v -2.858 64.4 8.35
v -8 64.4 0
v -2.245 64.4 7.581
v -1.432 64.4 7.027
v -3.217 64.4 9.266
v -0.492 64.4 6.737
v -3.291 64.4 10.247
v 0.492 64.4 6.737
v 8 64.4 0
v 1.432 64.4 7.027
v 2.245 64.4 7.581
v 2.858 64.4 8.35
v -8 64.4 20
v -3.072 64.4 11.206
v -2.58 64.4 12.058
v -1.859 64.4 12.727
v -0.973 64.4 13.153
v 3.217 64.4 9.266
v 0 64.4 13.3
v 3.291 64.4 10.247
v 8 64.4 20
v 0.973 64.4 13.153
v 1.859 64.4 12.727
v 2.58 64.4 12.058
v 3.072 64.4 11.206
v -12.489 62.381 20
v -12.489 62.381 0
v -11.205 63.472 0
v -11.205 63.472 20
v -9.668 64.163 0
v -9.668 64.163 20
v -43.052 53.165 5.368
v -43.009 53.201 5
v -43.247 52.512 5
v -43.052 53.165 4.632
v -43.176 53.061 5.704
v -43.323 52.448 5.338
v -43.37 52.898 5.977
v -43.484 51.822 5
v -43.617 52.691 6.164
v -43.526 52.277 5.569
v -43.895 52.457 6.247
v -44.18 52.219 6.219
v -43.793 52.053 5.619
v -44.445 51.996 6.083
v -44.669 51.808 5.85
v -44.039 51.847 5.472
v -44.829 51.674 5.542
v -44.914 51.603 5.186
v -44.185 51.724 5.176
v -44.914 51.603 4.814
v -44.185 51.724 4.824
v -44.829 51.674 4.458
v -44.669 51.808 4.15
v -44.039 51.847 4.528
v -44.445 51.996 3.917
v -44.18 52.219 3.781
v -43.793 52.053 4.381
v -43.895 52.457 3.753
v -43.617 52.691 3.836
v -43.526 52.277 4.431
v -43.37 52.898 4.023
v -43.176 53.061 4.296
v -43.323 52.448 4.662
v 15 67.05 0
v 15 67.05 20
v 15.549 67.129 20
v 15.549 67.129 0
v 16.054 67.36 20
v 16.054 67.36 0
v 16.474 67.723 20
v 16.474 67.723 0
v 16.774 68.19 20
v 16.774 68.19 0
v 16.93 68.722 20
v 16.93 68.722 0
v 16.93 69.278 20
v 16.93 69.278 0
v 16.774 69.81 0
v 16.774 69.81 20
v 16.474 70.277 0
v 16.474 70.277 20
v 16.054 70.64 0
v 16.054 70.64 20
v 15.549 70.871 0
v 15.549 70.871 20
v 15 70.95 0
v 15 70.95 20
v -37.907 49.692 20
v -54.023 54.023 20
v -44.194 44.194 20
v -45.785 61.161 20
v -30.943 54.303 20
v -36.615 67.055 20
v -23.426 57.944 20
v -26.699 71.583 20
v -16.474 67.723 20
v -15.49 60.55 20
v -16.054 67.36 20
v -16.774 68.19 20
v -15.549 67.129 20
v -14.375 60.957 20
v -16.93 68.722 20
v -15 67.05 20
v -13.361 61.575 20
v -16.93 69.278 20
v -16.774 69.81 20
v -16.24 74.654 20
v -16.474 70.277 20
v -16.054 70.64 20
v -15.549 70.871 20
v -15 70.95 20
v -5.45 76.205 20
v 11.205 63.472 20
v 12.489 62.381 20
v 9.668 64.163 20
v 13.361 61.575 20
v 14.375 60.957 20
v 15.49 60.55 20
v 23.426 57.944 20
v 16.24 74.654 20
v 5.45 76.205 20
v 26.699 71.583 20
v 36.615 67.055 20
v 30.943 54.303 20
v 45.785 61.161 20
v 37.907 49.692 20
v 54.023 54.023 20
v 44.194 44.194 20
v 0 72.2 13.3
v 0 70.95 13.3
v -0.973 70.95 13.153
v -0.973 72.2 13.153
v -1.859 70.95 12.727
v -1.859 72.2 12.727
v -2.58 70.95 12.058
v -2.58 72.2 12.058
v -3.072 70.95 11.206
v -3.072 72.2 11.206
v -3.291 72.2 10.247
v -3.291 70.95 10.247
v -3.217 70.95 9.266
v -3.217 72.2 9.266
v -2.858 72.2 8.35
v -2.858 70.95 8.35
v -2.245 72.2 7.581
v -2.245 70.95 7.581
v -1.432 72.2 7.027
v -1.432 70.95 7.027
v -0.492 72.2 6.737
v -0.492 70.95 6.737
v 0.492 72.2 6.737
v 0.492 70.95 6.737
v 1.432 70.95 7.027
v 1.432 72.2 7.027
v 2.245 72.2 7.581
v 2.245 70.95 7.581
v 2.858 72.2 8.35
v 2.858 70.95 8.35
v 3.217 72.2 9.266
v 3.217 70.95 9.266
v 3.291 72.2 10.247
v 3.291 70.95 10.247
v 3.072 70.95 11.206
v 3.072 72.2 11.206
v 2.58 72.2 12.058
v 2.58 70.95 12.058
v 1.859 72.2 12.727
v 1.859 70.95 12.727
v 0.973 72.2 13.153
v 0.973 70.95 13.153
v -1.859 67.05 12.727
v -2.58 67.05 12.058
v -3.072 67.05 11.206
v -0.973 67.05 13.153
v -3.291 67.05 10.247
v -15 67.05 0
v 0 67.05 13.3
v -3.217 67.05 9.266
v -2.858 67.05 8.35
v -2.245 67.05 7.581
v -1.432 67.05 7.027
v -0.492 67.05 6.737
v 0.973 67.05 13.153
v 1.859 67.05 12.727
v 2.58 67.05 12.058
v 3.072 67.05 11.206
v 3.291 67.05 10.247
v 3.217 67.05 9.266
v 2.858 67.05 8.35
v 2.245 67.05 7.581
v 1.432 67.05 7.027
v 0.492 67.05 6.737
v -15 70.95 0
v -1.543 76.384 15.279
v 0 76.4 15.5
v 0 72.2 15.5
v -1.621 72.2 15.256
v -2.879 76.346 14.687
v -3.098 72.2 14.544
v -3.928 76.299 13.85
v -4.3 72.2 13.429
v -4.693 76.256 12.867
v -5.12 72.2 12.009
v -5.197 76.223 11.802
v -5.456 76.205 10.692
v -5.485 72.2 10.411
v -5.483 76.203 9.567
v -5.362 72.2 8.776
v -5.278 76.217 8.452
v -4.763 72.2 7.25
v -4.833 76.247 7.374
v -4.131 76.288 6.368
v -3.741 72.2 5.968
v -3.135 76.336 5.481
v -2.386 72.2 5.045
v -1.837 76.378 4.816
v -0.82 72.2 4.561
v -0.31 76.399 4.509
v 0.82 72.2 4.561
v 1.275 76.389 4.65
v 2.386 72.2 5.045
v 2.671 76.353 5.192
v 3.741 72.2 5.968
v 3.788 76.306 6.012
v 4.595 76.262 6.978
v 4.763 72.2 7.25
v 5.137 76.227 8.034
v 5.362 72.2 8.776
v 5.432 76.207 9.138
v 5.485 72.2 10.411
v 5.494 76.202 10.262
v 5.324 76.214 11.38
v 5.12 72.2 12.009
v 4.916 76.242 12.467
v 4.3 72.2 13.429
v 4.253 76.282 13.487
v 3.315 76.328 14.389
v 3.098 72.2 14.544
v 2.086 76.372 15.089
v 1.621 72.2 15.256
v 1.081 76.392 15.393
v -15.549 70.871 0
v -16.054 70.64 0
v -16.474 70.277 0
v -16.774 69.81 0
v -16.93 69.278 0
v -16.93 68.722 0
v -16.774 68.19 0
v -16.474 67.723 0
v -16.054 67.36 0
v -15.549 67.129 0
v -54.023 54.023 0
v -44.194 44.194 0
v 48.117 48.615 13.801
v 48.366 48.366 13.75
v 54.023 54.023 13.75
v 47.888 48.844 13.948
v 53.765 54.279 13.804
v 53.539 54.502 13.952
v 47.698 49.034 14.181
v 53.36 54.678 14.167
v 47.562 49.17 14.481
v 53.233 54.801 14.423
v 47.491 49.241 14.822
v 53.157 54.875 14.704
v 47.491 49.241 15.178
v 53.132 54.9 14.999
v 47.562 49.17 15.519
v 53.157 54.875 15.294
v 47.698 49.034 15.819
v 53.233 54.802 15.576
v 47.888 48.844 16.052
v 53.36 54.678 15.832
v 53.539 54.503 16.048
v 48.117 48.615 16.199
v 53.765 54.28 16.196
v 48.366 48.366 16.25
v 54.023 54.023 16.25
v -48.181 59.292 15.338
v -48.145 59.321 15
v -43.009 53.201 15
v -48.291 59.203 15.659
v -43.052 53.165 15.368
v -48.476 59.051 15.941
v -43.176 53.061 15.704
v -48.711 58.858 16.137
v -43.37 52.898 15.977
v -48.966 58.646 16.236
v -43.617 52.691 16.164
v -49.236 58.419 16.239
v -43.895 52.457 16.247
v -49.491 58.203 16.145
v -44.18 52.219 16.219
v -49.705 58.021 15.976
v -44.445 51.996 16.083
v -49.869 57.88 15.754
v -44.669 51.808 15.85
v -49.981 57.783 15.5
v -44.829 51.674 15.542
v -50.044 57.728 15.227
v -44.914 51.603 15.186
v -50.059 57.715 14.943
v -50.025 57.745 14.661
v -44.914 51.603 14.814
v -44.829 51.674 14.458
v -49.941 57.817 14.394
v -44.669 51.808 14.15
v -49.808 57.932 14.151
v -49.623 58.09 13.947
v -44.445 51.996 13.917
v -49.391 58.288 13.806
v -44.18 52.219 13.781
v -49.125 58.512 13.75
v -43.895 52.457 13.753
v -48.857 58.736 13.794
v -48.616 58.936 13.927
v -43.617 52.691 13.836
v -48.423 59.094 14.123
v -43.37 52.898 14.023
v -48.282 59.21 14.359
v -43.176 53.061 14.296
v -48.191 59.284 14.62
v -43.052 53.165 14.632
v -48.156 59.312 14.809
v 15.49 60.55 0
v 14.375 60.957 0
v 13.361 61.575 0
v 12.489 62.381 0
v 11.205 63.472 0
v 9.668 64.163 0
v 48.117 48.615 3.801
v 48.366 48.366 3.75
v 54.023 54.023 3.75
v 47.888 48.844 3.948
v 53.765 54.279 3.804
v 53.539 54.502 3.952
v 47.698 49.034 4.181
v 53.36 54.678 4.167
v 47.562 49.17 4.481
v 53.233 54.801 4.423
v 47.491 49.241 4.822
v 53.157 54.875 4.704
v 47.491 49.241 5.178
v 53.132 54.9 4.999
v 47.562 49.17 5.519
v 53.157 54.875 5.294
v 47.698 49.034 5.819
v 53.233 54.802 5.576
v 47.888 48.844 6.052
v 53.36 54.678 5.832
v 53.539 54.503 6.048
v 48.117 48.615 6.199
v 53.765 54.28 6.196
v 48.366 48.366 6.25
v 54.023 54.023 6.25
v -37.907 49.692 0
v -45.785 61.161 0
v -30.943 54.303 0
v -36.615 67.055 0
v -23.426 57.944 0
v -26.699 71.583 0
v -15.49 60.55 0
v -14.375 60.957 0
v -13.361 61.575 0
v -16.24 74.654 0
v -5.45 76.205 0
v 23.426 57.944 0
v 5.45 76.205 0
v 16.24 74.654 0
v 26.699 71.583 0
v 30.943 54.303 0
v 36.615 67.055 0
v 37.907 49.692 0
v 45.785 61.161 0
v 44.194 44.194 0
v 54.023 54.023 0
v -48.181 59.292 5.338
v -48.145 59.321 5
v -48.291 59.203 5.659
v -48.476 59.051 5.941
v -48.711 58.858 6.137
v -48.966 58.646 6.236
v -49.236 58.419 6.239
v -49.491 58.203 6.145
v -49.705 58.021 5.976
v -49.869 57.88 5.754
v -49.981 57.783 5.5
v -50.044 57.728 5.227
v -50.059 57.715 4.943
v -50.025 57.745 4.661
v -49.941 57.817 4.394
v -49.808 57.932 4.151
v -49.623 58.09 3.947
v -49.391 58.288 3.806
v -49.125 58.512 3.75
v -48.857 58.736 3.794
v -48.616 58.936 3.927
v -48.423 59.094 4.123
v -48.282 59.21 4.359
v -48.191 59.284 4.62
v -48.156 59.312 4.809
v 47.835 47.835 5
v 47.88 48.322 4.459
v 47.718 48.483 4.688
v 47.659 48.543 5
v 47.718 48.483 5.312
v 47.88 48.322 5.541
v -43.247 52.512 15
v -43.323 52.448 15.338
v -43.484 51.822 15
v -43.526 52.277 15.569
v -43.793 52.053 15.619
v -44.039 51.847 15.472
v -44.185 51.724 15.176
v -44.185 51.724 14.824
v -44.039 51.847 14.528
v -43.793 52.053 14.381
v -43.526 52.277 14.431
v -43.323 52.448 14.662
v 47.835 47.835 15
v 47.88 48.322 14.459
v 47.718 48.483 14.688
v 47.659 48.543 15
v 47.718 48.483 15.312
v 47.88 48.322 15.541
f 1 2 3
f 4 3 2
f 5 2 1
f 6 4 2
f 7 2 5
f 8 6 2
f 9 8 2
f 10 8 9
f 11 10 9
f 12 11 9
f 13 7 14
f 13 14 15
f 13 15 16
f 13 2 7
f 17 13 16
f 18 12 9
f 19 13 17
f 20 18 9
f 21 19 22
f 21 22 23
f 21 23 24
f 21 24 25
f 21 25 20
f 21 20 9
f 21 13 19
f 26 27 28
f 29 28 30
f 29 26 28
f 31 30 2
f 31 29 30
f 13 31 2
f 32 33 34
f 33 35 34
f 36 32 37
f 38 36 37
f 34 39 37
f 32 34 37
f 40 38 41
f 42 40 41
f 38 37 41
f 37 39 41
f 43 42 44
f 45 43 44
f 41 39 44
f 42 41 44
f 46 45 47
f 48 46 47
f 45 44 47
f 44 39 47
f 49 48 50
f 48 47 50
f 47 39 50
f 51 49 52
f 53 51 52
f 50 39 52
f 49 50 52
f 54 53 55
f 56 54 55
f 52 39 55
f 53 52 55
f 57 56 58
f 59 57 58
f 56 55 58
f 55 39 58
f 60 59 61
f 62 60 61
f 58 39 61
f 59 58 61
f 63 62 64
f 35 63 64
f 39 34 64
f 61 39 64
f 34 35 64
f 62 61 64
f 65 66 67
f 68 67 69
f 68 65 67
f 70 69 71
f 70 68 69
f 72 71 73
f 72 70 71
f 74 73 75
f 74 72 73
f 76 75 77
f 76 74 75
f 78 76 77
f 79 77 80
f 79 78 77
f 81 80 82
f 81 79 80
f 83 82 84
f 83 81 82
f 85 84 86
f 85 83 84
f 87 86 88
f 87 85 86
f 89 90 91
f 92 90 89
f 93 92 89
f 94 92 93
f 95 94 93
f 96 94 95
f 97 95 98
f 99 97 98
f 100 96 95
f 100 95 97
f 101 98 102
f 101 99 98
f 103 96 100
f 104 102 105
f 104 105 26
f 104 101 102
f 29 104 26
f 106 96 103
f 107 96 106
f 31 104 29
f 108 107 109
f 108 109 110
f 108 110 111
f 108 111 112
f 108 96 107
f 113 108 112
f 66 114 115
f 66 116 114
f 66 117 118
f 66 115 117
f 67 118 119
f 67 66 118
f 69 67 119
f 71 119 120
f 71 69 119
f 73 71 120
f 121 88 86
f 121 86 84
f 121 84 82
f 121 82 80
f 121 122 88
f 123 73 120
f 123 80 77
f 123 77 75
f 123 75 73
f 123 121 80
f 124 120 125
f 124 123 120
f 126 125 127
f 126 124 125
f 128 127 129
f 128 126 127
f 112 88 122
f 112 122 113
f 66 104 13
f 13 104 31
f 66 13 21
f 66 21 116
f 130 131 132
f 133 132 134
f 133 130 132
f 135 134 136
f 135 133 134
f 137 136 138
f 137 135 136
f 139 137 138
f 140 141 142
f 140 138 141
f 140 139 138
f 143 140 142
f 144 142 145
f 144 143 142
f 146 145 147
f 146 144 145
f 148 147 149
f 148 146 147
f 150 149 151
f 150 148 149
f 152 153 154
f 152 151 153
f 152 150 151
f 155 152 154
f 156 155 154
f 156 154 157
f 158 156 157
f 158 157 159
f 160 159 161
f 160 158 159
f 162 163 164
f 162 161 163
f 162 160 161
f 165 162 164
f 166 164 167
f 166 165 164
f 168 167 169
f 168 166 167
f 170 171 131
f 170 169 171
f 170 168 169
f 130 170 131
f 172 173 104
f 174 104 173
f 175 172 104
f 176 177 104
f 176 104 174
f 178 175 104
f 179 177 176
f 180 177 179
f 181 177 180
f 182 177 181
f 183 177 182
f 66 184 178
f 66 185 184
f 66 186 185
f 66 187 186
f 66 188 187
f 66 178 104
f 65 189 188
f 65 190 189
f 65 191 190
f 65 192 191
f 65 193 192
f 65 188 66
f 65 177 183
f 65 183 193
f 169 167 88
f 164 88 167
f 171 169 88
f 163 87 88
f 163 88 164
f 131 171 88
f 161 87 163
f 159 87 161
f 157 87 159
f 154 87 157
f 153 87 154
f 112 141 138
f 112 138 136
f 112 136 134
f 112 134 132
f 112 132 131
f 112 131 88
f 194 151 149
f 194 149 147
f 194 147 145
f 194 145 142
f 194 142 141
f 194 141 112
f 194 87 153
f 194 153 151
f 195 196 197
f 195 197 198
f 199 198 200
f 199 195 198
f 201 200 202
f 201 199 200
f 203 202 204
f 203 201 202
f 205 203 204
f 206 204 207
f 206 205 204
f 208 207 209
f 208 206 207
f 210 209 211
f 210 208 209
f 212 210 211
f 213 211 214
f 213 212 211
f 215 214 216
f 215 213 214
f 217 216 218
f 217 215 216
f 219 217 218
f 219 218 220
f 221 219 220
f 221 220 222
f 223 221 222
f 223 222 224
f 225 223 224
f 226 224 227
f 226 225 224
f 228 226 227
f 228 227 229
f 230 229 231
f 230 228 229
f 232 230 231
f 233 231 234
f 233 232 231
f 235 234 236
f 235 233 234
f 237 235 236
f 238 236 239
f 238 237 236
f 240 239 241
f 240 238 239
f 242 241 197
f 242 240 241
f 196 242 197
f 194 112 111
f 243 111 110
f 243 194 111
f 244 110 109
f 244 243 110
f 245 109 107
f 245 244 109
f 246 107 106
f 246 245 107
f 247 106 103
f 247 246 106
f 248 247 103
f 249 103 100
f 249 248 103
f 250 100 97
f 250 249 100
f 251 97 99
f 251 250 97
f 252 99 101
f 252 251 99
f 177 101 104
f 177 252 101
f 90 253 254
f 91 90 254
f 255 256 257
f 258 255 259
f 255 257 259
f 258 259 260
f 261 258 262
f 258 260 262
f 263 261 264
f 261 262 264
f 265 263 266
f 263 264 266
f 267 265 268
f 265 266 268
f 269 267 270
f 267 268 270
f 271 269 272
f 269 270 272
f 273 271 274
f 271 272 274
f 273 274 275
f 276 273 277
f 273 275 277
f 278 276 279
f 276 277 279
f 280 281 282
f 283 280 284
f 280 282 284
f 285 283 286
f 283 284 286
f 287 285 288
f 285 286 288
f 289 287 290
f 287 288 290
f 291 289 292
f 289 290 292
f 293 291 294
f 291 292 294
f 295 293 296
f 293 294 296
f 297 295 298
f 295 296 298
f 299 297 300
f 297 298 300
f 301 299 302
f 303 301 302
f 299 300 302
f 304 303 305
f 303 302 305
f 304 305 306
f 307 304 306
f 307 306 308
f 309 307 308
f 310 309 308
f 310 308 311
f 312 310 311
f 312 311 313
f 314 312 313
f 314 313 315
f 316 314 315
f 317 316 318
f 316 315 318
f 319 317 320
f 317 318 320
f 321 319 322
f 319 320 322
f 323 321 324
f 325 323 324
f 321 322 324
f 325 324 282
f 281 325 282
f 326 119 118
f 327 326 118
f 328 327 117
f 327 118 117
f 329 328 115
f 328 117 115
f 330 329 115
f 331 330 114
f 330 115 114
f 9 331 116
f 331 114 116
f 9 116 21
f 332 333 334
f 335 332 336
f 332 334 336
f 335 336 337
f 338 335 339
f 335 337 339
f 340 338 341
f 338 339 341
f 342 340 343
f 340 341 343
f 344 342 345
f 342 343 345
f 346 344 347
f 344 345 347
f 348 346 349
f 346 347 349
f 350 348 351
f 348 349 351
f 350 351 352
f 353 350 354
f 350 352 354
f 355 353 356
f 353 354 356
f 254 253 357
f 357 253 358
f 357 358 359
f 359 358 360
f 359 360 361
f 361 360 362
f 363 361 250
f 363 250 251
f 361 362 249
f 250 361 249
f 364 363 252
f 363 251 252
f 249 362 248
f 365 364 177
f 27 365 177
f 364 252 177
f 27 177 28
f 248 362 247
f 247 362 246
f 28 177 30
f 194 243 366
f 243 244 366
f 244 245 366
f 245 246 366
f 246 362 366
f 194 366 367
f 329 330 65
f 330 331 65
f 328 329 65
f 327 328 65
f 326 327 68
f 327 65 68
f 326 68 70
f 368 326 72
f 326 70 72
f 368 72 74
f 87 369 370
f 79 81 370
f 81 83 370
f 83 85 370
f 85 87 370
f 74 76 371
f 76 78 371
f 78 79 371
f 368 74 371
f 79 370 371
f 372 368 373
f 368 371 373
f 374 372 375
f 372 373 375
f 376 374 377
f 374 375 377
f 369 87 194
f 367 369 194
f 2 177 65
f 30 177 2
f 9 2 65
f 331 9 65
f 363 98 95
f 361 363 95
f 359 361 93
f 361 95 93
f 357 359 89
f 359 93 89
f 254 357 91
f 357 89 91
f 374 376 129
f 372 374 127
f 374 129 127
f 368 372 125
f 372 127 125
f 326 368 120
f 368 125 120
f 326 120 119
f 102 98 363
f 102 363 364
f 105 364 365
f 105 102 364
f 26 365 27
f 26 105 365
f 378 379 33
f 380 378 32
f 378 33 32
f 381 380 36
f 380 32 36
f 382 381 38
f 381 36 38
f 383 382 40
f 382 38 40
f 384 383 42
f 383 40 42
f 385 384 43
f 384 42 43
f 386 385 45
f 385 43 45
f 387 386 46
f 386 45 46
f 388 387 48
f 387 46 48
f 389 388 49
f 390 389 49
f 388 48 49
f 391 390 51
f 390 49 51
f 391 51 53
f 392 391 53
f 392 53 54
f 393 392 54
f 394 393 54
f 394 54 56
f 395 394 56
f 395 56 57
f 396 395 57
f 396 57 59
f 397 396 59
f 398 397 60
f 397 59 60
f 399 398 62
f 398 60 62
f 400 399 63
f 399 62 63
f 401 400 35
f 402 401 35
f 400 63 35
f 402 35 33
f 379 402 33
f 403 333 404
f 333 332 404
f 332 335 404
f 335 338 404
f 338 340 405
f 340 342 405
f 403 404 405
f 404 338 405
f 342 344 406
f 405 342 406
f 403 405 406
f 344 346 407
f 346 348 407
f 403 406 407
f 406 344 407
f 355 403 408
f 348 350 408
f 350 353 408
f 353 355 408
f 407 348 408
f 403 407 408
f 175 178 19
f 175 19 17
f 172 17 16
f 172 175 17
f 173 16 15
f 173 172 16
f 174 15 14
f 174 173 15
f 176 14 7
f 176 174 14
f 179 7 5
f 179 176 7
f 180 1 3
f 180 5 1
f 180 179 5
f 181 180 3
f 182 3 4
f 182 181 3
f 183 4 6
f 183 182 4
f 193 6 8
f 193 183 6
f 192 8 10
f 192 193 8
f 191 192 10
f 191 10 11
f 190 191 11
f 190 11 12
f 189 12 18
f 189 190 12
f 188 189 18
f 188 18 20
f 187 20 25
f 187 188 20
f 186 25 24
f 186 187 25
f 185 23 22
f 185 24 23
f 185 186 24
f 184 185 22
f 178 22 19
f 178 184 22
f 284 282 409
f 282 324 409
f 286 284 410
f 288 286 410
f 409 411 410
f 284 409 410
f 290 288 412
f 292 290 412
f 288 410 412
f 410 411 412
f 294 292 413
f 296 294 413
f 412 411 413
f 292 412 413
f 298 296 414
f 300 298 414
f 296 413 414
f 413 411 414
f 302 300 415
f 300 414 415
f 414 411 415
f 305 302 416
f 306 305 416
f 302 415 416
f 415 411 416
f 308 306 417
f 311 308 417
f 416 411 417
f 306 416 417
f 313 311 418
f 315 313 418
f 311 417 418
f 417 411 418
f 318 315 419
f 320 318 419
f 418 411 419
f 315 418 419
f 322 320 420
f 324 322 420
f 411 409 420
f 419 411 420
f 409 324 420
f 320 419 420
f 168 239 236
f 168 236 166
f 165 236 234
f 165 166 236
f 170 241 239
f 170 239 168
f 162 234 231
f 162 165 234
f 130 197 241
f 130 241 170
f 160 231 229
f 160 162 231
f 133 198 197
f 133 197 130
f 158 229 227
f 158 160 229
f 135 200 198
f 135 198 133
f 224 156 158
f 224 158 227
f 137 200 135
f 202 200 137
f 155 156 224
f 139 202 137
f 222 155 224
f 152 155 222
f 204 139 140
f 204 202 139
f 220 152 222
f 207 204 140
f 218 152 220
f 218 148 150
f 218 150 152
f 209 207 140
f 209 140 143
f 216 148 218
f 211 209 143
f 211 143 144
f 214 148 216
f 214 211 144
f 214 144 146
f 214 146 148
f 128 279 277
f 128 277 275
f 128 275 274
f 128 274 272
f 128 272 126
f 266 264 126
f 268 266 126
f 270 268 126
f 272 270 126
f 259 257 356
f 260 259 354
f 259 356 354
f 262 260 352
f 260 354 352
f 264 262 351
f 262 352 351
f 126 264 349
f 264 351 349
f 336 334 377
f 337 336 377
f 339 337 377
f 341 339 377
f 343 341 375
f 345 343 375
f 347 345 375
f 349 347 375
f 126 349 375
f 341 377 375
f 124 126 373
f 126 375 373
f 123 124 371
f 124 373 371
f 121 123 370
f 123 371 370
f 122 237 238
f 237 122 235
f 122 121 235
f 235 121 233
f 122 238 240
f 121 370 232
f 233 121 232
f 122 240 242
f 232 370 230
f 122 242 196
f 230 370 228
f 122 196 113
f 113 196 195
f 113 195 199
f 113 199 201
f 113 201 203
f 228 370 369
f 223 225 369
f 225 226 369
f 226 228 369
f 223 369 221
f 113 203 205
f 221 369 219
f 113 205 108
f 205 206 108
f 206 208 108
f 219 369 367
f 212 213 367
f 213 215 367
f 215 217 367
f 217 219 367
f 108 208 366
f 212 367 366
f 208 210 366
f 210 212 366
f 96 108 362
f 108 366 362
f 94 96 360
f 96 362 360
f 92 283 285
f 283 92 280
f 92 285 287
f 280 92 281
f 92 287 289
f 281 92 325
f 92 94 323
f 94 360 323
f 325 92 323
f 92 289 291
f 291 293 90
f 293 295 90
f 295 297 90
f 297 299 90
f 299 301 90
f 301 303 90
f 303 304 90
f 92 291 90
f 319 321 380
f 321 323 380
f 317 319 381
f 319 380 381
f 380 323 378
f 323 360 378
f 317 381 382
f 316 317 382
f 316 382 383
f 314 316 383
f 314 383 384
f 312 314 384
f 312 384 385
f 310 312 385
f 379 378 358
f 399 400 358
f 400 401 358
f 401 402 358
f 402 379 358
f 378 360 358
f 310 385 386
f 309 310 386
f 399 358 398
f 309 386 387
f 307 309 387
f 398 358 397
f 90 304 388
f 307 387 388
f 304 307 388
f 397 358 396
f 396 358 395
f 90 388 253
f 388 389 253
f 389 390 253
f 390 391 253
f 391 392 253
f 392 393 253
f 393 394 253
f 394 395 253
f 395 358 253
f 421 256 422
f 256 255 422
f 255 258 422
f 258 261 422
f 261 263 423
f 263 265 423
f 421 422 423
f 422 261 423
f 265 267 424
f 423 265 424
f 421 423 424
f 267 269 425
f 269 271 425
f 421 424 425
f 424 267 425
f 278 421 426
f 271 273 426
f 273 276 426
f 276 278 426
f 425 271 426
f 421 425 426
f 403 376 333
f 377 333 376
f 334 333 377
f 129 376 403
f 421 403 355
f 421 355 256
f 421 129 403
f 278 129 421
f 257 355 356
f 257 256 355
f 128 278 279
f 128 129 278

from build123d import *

# Parameters (mm, degrees)
SKETCH1_R                    = 76.4
BOSS_EXTRUDE1_DEPTH          = 20
CUT_EXTRUDE1_REACH           = 111.881
SKETCH2_R                    = 62.5
CUT_EXTRUDE2_DEPTH           = 110.881390599
CIRPATTERN1_COUNT            = 4
R_P_TITION_CIRCULAIRE2_COUNT = 4
CUT_EXTRUDE4_START           = -20
CUT_EXTRUDE4_DEPTH           = 130.881390756
CIRPATTERN8_COUNT            = 4
CIRPATTERN8_START            = -20
CIRPATTERN8_COPY_1_DEPTH     = 130.881390756
CIRPATTERN8_COPY_2_DEPTH     = 130.881390756
CIRPATTERN8_COPY_3_DEPTH     = 130.881390756
SPLIT1_SURFACE_1_BACK        = 218.015
SPLIT1_SURFACE_1_DEPTH       = 436.03


# Read off the part's stored shape, not the designer's step: Répétition circulaire1, Répétition linéaire1
with BuildPart() as part:
    # Sketch1 → Boss-Extrude1 (new body)
    with BuildSketch(Plane.XY):
        Circle(SKETCH1_R)
    extrude(amount=BOSS_EXTRUDE1_DEPTH)

    # Sketch2 → Cut-Extrude1 (cut, up to next)
    with BuildSketch(Plane.XY.offset(20), mode=Mode.PRIVATE) as cut_extrude1_sk1:
        Circle(SKETCH2_R)
    cut_extrude1_tool1 = extrude(cut_extrude1_sk1.sketch, amount=-CUT_EXTRUDE1_REACH, mode=Mode.PRIVATE) & part.part
    add(cut_extrude1_tool1.solids().sort_by_distance((0, 0, 20))[0], mode=Mode.SUBTRACT)

    # Sketch39 → Cut-Extrude2 (cut, through all)
    with BuildSketch(Plane(origin=(0, 0, 0), x_dir=(-1, 0, 0), z_dir=(0, 0, -1))):
        with BuildLine():
            Line((-15, 70.95), (15, 70.95))
            ThreePointArc((15, 70.95), (16.95, 69), (15, 67.05))
            Line((15, 67.05), (-15, 67.05))
            ThreePointArc((-15, 67.05), (-16.95, 69), (-15, 70.95))
        make_face()
    cut_extrude2 = extrude(amount=-CUT_EXTRUDE2_DEPTH, mode=Mode.SUBTRACT)

    # CirPattern1: Cut-Extrude2 ×4 about axis
    cirpattern1_axis = Axis((0, 0, 0), (0, 0, 1))
    for i in range(1, CIRPATTERN1_COUNT):
        add(cut_extrude2.rotate(cirpattern1_axis, i * 360 / CIRPATTERN1_COUNT), mode=Mode.SUBTRACT)

    # Esquisse2 → M3 Tapped Hole1 (revolve, cut)
    with BuildSketch(Plane(origin=(49.10897338, -58.525795454, 5), x_dir=(0.766044443118979, 0.6427876096865381, 0), z_dir=(0, 0, 1))):
        Polygon((0, 0), (0, 8.751075774), (1.25, 8), (1.25, 0), align=None)
    revolve(axis=Axis((53.190674702, -63.390177668, 5), (-0.6427876096865383, 0.766044443118979, 0)), mode=Mode.SUBTRACT)

    # Esquisse2 at point 2 (carried to point 2, square into its face) → M3 Tapped Hole1 at 2 (revolve, cut)
    with BuildSketch(Plane(origin=(-54.022958083, -54.022958083, 5), x_dir=(0.707106781, -0.707106781, 0), z_dir=(0, 0, 1))):
        Polygon((0, 0), (0, 8.751075774), (1.25, 8), (1.25, 0), align=None)
    revolve(axis=Axis((-58.513086143, -58.513086143, 5), (0.707106781, 0.707106781, 0)), mode=Mode.SUBTRACT)

    # Esquisse2 at point 3 (carried to point 3, square into its face) → M3 Tapped Hole1 at 3 (revolve, cut)
    with BuildSketch(Plane(origin=(-58.525795454, 49.10897338, 5), x_dir=(-0.642788057, -0.766044068, 0), z_dir=(0, 0, 1))):
        Polygon((0, 0), (0, 8.751075774), (1.25, 8), (1.25, 0), align=None)
    revolve(axis=Axis((-63.390175285, 53.190677542, 5), (0.766044068, -0.642788057, 0)), mode=Mode.SUBTRACT)

    # Répétition circulaire1 outline → Répétition circulaire1 (revolve, cut)
    with BuildSketch(Plane(origin=(0, 0, 5), x_dir=(0.6427876096865408, 0.7660444431189769, 0), z_dir=(0, 0, -1))):
        Polygon((0, 67.648924226), (1.25, 68.4), (1.25, 76.400001412), (0, 76.400001412), align=None)
    revolve(axis=Axis((0, 0, 5), (0.7660444431189771, -0.6427876096865409, 0)), mode=Mode.SUBTRACT)

    # R_p_tition circulaire1 2 outline → R_p_tition circulaire1 2 (revolve, cut)
    with BuildSketch(Plane(origin=(0, 0, 5), x_dir=(0.707106781186546, -0.707106781186549, 0), z_dir=(0, 0, 1))):
        Polygon((0, 67.648924226), (1.25, 68.4), (1.25, 76.400001412), (0, 76.400001412), align=None)
    revolve(axis=Axis((0, 0, 5), (0.707106781186549, 0.707106781186546, 0)), mode=Mode.SUBTRACT)

    # R_p_tition circulaire1 3 outline → R_p_tition circulaire1 3 (revolve, cut)
    with BuildSketch(Plane(origin=(0, 0, 5), x_dir=(0.7660444431189789, 0.6427876096865381, 0), z_dir=(0, 0, -1))):
        Polygon((1.25, -76.400001412), (1.25, -68.4), (0, -67.648924226), (0, -76.400001412), align=None)
    revolve(axis=Axis((0, 0, 5), (0.6427876096865381, -0.7660444431189789, 0)), mode=Mode.SUBTRACT)

    # Répétition linéaire1 outline → Répétition linéaire1 (revolve, cut)
    with BuildSketch(Plane(origin=(0, 0, 15), x_dir=(0.6427876096865408, 0.7660444431189769, 0), z_dir=(0, 0, -1))):
        Polygon((1.25, -76.400001412), (1.25, -68.4), (0, -67.648924226), (0, -76.400001412), align=None)
        Polygon((0, 76.400001412), (0, 67.648924226), (1.25, 68.4), (1.25, 76.400001412), align=None)
    revolve(axis=Axis((0, 0, 15), (0.7660444431189771, -0.6427876096865409, 0)), mode=Mode.SUBTRACT)

    # R_p_tition lin_aire1 2 outline → R_p_tition lin_aire1 2 (revolve, cut)
    with BuildSketch(Plane(origin=(0, 0, 15), x_dir=(0.707106781186546, -0.707106781186549, 0), z_dir=(0, 0, 1))):
        Polygon((1.25, -76.400001412), (1.25, -68.4), (0, -67.648924226), (0, -76.400001412), align=None)
        Polygon((0, 76.400001412), (0, 67.648924226), (1.25, 68.4), (1.25, 76.400001412), align=None)
    revolve(axis=Axis((0, 0, 15), (0.707106781186549, 0.707106781186546, 0)), mode=Mode.SUBTRACT)

    # R_p_tition lin_aire1 3 outline → R_p_tition lin_aire1 3 (revolve, cut)
    with BuildSketch(Plane(origin=(0, 0, 15), x_dir=(0.7660444431189789, 0.6427876096865381, 0), z_dir=(0, 0, -1))):
        Polygon((0, 67.648924226), (1.25, 68.4), (1.25, 76.400001412), (0, 76.400001412), align=None)
        Polygon((1.25, -68.4), (0, -67.648924226), (0, -76.400001412), (1.25, -76.400001412), align=None)
    revolve(axis=Axis((0, 0, 15), (0.6427876096865381, -0.7660444431189789, 0)), mode=Mode.SUBTRACT)

    # Esquisse4 → CBORE for M6 Hex Socket Head Cap Screw1 (revolve, cut)
    with BuildSketch(Plane(origin=(0, 76.4, 10), x_dir=(0, 0, 1), z_dir=(1, 0, 0))):
        Polygon((0, 0), (0, 30.482840043), (3.3, 28.5), (3.3, 4.2), (5.5, 4.2), (5.5, 0), align=None)
    cbore_for_m6_hex_socket_head_cap_screw1 = revolve(axis=Axis((0, 82.75, 10), (0, -1, 0)), mode=Mode.SUBTRACT)

    # Répétition circulaire2: CBORE for M6 Hex Socket Head Cap Screw1 ×4 about axis
    r_p_tition_circulaire2_axis = Axis((0, 0, 0), (0, 0, 1))
    for i in range(1, R_P_TITION_CIRCULAIRE2_COUNT):
        add(cbore_for_m6_hex_socket_head_cap_screw1.rotate(r_p_tition_circulaire2_axis, i * 360 / R_P_TITION_CIRCULAIRE2_COUNT), mode=Mode.SUBTRACT)

    # Sketch47 → Cut-Extrude4 (cut)
    with BuildSketch(Plane(origin=(0, 0, 0), x_dir=(-1, 0, 0), z_dir=(0, 0, -1)).offset(CUT_EXTRUDE4_START)):
        with BuildLine():
            Line((8, 64.4), (0, 64.4))
            Line((0, 64.4), (0, 62.5))
            ThreePointArc((0, 62.5), (7.806310396, 62.010575856), (15.490361696, 60.549968576))
            ThreePointArc((15.490361696, 60.549968576), (13.852369253, 61.240856226), (12.488718209, 62.38138278))
            ThreePointArc((12.488718209, 62.38138278), (10.460864007, 63.872124664), (8, 64.4))
        make_face()
    cut_extrude4 = extrude(amount=CUT_EXTRUDE4_DEPTH, mode=Mode.SUBTRACT)

    # Mirror1: Cut-Extrude4 across plane
    add(cut_extrude4.mirror(Plane.ZY), mode=Mode.SUBTRACT)

    # CirPattern8: Cut-Extrude4 ×4 about axis
    cirpattern8_axis = Axis((0, 0, 0), (0, 0, 1))
    for i in range(1, CIRPATTERN8_COUNT):
        add(cut_extrude4.rotate(cirpattern8_axis, i * 360 / CIRPATTERN8_COUNT), mode=Mode.SUBTRACT)

    # CirPattern8 copy 1 sketch → CirPattern8 copy 1 (cut)
    with BuildSketch(Plane.YX.offset(CIRPATTERN8_START)):
        with BuildLine():
            Line((8, -64.4), (0, -64.4))
            Line((0, -64.4), (0, -62.5))
            ThreePointArc((0, -62.5), (7.806310396, -62.010575856), (15.490361696, -60.549968576))
            ThreePointArc((15.490361696, -60.549968576), (13.852369253, -61.240856226), (12.488718209, -62.38138278))
            ThreePointArc((12.488718209, -62.38138278), (10.460864007, -63.872124664), (8, -64.4))
        make_face()
    extrude(amount=CIRPATTERN8_COPY_1_DEPTH, mode=Mode.SUBTRACT)

    # CirPattern8 copy 2 sketch → CirPattern8 copy 2 (cut)
    with BuildSketch(Plane(origin=(0, 0, 0), x_dir=(-1, 0, 0), z_dir=(0, 0, -1)).offset(CIRPATTERN8_START)):
        with BuildLine():
            Line((8, -64.4), (0, -64.4))
            Line((0, -64.4), (0, -62.5))
            ThreePointArc((0, -62.5), (7.806310396, -62.010575856), (15.490361696, -60.549968576))
            ThreePointArc((15.490361696, -60.549968576), (13.852369253, -61.240856226), (12.488718209, -62.38138278))
            ThreePointArc((12.488718209, -62.38138278), (10.460864007, -63.872124664), (8, -64.4))
        make_face()
    extrude(amount=CIRPATTERN8_COPY_2_DEPTH, mode=Mode.SUBTRACT)

    # CirPattern8 copy 3 sketch → CirPattern8 copy 3 (cut)
    with BuildSketch(Plane(origin=(0, 0, 0), x_dir=(0, -1, 0), z_dir=(0, 0, -1)).offset(CIRPATTERN8_START)):
        with BuildLine():
            Line((8, -64.4), (0, -64.4))
            Line((0, -64.4), (0, -62.5))
            ThreePointArc((0, -62.5), (7.806310396, -62.010575856), (15.490361696, -60.549968576))
            ThreePointArc((15.490361696, -60.549968576), (13.852369253, -61.240856226), (12.488718209, -62.38138278))
            ThreePointArc((12.488718209, -62.38138278), (10.460864007, -63.872124664), (8, -64.4))
        make_face()
    extrude(amount=CIRPATTERN8_COPY_3_DEPTH, mode=Mode.SUBTRACT)

    # Split1: cut with a surface, the side behind it stays
    # Split1 surface: a surface, the sketch's curves swept straight by 436.03 mm
    with BuildLine(Plane(origin=(0, 0, 0), x_dir=(-1, 0, 0), z_dir=(0, 0, -1)).offset(-SPLIT1_SURFACE_1_BACK), mode=Mode.PRIVATE) as split1_surface_1_path:
        Line((73.828428705, 73.828428705), (0, 0))
        Line((0, 0), (-82.641961486, 82.641961486))
    split1_surface_1 = Shell.extrude(split1_surface_1_path.wire(), (0 * SPLIT1_SURFACE_1_DEPTH, 0 * SPLIT1_SURFACE_1_DEPTH, -1 * SPLIT1_SURFACE_1_DEPTH))
    split(bisect_by=split1_surface_1, keep=Keep.BOTTOM)


solid = part.part
